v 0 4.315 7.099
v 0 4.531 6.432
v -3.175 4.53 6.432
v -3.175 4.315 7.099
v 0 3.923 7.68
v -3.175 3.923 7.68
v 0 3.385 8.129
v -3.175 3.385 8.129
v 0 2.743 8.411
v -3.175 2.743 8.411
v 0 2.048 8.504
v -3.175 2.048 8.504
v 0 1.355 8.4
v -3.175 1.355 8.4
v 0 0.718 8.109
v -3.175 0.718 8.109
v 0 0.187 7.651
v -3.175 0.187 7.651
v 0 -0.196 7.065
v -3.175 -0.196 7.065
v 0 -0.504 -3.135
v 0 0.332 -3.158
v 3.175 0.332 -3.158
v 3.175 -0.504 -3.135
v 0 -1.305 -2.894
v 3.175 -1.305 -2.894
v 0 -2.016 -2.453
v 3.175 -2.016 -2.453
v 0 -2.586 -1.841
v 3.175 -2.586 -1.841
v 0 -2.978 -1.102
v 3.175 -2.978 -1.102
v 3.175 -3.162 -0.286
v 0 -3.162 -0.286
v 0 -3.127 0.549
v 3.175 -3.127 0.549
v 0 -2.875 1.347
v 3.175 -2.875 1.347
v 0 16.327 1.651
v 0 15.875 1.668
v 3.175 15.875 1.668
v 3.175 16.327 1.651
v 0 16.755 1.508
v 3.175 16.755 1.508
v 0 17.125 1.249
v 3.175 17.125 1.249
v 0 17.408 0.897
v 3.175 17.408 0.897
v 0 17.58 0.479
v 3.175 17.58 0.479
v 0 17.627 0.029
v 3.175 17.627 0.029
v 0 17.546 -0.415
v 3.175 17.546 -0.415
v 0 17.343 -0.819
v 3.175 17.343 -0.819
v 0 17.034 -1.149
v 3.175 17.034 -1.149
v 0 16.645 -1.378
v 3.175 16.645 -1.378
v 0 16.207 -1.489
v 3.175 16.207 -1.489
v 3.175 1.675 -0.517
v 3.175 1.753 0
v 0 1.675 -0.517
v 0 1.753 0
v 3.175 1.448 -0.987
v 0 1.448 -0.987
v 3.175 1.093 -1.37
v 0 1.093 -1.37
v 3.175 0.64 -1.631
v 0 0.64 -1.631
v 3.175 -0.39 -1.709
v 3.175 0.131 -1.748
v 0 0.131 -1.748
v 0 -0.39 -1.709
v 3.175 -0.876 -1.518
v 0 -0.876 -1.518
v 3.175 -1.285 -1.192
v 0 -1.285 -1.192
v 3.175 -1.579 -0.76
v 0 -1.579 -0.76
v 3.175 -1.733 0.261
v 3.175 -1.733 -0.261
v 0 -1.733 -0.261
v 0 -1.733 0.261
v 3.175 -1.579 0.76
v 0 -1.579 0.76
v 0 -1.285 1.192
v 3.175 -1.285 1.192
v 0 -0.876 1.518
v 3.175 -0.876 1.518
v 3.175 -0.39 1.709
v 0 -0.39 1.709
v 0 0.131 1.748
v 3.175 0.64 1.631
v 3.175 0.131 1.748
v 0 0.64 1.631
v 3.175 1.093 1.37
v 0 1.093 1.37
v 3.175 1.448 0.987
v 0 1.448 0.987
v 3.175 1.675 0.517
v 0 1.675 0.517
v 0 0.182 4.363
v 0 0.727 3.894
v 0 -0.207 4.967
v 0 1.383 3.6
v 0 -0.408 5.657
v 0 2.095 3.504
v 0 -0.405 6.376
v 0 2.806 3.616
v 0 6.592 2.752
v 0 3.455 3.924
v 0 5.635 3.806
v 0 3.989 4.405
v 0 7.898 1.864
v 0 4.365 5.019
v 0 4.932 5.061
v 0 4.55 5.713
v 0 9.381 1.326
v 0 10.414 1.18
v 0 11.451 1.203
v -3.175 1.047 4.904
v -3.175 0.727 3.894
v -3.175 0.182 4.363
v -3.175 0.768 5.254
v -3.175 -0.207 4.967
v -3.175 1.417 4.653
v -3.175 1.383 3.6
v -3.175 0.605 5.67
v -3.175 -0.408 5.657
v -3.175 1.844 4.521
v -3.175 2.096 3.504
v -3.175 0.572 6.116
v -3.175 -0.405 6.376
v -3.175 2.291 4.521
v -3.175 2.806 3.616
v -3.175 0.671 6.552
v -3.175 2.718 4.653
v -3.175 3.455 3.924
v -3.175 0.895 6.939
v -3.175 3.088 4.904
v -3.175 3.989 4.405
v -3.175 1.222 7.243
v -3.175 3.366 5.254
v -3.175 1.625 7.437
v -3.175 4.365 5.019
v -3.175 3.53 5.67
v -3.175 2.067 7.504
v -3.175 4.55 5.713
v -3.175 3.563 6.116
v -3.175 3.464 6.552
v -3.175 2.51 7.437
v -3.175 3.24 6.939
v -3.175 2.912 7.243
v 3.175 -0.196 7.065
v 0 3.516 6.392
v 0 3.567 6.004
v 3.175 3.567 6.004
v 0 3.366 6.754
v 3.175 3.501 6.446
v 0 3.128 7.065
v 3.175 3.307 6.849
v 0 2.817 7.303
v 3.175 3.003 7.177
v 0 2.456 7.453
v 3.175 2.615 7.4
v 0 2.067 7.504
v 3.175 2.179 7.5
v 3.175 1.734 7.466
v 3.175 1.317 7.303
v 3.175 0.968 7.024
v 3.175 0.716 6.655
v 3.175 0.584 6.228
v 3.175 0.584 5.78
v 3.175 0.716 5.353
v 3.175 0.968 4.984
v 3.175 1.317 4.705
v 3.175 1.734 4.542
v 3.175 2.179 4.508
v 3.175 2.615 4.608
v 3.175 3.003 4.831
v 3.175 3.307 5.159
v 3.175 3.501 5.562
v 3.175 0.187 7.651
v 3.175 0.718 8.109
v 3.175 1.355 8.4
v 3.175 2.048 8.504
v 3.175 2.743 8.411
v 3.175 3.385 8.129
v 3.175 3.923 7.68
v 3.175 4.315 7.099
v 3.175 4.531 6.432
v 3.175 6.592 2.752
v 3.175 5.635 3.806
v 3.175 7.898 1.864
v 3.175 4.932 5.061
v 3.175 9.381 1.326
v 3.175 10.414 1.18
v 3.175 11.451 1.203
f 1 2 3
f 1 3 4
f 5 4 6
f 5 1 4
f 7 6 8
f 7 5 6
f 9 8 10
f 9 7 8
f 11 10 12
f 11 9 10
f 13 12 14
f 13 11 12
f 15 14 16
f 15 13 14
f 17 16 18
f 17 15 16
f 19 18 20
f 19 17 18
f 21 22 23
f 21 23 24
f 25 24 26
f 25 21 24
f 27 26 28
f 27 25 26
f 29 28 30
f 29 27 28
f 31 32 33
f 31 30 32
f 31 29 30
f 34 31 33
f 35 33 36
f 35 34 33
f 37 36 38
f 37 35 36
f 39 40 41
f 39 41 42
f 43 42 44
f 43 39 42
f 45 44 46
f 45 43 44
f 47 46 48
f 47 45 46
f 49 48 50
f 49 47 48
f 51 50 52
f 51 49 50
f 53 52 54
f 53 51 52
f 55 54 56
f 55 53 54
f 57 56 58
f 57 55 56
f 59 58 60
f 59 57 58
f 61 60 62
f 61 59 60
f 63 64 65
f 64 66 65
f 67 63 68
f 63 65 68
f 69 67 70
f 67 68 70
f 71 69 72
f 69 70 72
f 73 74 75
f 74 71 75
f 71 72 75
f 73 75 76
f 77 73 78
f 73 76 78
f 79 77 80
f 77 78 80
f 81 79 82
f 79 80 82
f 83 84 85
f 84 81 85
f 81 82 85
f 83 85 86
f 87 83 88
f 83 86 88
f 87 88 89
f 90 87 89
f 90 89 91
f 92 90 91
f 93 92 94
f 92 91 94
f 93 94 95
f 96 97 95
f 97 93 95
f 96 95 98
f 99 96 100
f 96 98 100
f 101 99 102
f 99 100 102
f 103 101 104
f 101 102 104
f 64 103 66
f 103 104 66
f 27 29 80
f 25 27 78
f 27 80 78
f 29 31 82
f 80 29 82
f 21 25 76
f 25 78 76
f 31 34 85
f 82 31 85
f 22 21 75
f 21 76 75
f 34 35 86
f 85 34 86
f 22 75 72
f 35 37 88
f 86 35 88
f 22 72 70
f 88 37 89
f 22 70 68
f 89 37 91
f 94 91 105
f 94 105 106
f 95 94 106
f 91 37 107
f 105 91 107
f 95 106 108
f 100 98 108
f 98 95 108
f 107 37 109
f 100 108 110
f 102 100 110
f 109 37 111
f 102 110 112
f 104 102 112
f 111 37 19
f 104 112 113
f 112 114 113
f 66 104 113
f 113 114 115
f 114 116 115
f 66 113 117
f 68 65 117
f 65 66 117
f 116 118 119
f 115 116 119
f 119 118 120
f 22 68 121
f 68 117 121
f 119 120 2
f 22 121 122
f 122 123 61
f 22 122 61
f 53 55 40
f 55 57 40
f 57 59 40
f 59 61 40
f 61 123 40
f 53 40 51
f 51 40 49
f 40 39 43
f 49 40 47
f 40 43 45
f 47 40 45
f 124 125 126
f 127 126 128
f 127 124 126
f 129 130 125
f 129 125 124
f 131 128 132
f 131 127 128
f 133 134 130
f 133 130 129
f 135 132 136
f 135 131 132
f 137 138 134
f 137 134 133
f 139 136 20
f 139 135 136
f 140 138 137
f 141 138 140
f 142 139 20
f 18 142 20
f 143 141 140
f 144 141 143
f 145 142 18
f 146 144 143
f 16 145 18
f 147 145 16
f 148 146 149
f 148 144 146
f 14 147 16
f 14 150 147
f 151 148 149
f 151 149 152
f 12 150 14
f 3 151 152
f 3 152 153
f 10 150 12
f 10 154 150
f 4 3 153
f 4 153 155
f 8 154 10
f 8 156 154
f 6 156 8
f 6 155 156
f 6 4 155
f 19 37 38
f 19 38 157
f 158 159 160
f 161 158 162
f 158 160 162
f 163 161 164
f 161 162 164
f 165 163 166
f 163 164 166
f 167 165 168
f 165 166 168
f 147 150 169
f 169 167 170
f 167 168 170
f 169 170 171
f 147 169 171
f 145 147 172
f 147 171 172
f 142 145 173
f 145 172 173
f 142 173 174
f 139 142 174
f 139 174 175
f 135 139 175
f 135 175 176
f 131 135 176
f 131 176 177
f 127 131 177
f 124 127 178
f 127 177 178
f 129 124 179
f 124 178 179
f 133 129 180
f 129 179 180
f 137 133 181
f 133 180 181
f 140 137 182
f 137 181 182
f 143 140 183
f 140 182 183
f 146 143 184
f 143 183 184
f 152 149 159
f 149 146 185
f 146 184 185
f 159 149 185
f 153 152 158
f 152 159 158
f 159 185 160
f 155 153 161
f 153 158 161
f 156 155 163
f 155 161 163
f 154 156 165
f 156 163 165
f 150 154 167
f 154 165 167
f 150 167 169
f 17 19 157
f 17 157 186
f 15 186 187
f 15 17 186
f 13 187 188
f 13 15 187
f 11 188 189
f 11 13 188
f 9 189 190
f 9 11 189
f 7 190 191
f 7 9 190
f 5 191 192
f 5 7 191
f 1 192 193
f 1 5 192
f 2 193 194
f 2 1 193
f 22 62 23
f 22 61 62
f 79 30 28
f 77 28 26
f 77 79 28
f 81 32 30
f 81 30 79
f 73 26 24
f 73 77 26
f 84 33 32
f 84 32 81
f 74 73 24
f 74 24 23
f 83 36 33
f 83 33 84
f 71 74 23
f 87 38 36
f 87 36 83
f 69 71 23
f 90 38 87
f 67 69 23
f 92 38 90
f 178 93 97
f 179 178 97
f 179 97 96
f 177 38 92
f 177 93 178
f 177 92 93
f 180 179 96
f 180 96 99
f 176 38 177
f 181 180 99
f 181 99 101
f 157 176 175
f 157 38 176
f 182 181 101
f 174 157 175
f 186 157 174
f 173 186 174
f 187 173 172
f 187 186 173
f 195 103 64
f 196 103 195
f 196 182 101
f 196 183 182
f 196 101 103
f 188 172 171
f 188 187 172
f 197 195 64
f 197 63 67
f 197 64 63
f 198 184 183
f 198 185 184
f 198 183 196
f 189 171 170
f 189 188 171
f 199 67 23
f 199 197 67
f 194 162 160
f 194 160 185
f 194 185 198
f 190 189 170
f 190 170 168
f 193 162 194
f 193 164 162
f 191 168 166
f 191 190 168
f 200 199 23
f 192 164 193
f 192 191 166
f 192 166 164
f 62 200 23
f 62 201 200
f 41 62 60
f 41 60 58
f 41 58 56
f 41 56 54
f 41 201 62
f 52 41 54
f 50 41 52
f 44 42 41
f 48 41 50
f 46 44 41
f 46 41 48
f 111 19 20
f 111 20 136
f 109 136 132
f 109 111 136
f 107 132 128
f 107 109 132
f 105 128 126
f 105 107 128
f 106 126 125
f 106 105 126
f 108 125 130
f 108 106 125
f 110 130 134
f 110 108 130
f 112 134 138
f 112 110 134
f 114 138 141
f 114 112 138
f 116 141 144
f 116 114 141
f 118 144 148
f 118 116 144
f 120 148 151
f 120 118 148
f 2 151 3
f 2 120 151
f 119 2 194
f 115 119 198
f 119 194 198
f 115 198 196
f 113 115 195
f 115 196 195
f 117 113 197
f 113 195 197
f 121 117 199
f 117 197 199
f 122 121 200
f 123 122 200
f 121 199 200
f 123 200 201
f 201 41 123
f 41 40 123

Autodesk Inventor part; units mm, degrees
ref_plane "YZ Plane" through (0, 0, 0) normal (1, 0, 0) x (0, 1, 0)
ref_plane "XZ Plane" through (0, 0, 0) normal (0, 1, 0) x (-1, 0, 0)
ref_plane "XY Plane" through (0, 0, 0) normal (0, 0, 1) x (1, 0, 0)
sketch "Sketch1" plane through (0, 0, 0) normal (1, 0, 0) x (0, 1, 0)
  circle A0 centre (0, 0) radius 1.7526
  circle A1 centre (0, 0) radius 3.175
  circle A2 centre (2.0674, 6.004) radius 3.5 construction
  circle A3 centre (2.0674, 6.004) radius 1.5
  circle A4 centre (2.0674, 6.004) radius 2.5
  line L0 (-2.8751, 1.3469) -> (-0.1965, 7.0646)
  line L1 (0, 0) -> (15.875, 1.6685) construction
  line L2 (0, 0) -> (3.175, 0) construction
  line L3 (3.0949, -0.7087) -> (4.5043, 5.446)
  circle A5 centre (16.0409, 0.0897) radius 1.5875
  line L4 (15.875, 1.6685) -> (3.3375, 0.3508)
  line L5 (16.2069, -1.4891) -> (0.3319, -3.1576)
  line L6 (2.0674, 6.004) -> (0, 0) construction
  line L7 (2.0674, 6.004) -> (3.4856, 5.5157) construction
  line L8 (0, 0) -> (1.6571, -0.5706) construction
  dimension "d0" = 3.5052
  dimension "d7" = 3
  dimension "d1" = 6.35
  dimension "d4" = 7
  dimension "d8" = 5
  dimension "d9" = 6
  dimension "d10" = 15.875
  dimension "d11" = 3.175
  dimension "d15" = 6.35
  dimension "d16" = 65
extrude "Extrusion1" add sketch "Sketch1" along normal blind 3.175
fillet "Fillet1" radius 6.35 1 edges at (1.5875, 3.3375, 0.3508)
sketch "Sketch2" plane through (0, 0, 0) normal (-1, 0, 0) x (0, 0, 1)
  circle A0 centre (6.004, 2.0674) radius 1.5 projected
  arc A1 (7.0646, -0.1965) -> (6.4319, 4.5305) centre (6.004, 2.0674) ccw projected
  circle A2 centre (6.004, 2.0674) radius 2.5
  point P0 (0, 0)
  point P1 (7.0646, -0.1965)
extrude "Extrusion2" add sketch "Sketch2" along normal blind 3.175
properties part number "Lever" material "Aluminum 6061"
